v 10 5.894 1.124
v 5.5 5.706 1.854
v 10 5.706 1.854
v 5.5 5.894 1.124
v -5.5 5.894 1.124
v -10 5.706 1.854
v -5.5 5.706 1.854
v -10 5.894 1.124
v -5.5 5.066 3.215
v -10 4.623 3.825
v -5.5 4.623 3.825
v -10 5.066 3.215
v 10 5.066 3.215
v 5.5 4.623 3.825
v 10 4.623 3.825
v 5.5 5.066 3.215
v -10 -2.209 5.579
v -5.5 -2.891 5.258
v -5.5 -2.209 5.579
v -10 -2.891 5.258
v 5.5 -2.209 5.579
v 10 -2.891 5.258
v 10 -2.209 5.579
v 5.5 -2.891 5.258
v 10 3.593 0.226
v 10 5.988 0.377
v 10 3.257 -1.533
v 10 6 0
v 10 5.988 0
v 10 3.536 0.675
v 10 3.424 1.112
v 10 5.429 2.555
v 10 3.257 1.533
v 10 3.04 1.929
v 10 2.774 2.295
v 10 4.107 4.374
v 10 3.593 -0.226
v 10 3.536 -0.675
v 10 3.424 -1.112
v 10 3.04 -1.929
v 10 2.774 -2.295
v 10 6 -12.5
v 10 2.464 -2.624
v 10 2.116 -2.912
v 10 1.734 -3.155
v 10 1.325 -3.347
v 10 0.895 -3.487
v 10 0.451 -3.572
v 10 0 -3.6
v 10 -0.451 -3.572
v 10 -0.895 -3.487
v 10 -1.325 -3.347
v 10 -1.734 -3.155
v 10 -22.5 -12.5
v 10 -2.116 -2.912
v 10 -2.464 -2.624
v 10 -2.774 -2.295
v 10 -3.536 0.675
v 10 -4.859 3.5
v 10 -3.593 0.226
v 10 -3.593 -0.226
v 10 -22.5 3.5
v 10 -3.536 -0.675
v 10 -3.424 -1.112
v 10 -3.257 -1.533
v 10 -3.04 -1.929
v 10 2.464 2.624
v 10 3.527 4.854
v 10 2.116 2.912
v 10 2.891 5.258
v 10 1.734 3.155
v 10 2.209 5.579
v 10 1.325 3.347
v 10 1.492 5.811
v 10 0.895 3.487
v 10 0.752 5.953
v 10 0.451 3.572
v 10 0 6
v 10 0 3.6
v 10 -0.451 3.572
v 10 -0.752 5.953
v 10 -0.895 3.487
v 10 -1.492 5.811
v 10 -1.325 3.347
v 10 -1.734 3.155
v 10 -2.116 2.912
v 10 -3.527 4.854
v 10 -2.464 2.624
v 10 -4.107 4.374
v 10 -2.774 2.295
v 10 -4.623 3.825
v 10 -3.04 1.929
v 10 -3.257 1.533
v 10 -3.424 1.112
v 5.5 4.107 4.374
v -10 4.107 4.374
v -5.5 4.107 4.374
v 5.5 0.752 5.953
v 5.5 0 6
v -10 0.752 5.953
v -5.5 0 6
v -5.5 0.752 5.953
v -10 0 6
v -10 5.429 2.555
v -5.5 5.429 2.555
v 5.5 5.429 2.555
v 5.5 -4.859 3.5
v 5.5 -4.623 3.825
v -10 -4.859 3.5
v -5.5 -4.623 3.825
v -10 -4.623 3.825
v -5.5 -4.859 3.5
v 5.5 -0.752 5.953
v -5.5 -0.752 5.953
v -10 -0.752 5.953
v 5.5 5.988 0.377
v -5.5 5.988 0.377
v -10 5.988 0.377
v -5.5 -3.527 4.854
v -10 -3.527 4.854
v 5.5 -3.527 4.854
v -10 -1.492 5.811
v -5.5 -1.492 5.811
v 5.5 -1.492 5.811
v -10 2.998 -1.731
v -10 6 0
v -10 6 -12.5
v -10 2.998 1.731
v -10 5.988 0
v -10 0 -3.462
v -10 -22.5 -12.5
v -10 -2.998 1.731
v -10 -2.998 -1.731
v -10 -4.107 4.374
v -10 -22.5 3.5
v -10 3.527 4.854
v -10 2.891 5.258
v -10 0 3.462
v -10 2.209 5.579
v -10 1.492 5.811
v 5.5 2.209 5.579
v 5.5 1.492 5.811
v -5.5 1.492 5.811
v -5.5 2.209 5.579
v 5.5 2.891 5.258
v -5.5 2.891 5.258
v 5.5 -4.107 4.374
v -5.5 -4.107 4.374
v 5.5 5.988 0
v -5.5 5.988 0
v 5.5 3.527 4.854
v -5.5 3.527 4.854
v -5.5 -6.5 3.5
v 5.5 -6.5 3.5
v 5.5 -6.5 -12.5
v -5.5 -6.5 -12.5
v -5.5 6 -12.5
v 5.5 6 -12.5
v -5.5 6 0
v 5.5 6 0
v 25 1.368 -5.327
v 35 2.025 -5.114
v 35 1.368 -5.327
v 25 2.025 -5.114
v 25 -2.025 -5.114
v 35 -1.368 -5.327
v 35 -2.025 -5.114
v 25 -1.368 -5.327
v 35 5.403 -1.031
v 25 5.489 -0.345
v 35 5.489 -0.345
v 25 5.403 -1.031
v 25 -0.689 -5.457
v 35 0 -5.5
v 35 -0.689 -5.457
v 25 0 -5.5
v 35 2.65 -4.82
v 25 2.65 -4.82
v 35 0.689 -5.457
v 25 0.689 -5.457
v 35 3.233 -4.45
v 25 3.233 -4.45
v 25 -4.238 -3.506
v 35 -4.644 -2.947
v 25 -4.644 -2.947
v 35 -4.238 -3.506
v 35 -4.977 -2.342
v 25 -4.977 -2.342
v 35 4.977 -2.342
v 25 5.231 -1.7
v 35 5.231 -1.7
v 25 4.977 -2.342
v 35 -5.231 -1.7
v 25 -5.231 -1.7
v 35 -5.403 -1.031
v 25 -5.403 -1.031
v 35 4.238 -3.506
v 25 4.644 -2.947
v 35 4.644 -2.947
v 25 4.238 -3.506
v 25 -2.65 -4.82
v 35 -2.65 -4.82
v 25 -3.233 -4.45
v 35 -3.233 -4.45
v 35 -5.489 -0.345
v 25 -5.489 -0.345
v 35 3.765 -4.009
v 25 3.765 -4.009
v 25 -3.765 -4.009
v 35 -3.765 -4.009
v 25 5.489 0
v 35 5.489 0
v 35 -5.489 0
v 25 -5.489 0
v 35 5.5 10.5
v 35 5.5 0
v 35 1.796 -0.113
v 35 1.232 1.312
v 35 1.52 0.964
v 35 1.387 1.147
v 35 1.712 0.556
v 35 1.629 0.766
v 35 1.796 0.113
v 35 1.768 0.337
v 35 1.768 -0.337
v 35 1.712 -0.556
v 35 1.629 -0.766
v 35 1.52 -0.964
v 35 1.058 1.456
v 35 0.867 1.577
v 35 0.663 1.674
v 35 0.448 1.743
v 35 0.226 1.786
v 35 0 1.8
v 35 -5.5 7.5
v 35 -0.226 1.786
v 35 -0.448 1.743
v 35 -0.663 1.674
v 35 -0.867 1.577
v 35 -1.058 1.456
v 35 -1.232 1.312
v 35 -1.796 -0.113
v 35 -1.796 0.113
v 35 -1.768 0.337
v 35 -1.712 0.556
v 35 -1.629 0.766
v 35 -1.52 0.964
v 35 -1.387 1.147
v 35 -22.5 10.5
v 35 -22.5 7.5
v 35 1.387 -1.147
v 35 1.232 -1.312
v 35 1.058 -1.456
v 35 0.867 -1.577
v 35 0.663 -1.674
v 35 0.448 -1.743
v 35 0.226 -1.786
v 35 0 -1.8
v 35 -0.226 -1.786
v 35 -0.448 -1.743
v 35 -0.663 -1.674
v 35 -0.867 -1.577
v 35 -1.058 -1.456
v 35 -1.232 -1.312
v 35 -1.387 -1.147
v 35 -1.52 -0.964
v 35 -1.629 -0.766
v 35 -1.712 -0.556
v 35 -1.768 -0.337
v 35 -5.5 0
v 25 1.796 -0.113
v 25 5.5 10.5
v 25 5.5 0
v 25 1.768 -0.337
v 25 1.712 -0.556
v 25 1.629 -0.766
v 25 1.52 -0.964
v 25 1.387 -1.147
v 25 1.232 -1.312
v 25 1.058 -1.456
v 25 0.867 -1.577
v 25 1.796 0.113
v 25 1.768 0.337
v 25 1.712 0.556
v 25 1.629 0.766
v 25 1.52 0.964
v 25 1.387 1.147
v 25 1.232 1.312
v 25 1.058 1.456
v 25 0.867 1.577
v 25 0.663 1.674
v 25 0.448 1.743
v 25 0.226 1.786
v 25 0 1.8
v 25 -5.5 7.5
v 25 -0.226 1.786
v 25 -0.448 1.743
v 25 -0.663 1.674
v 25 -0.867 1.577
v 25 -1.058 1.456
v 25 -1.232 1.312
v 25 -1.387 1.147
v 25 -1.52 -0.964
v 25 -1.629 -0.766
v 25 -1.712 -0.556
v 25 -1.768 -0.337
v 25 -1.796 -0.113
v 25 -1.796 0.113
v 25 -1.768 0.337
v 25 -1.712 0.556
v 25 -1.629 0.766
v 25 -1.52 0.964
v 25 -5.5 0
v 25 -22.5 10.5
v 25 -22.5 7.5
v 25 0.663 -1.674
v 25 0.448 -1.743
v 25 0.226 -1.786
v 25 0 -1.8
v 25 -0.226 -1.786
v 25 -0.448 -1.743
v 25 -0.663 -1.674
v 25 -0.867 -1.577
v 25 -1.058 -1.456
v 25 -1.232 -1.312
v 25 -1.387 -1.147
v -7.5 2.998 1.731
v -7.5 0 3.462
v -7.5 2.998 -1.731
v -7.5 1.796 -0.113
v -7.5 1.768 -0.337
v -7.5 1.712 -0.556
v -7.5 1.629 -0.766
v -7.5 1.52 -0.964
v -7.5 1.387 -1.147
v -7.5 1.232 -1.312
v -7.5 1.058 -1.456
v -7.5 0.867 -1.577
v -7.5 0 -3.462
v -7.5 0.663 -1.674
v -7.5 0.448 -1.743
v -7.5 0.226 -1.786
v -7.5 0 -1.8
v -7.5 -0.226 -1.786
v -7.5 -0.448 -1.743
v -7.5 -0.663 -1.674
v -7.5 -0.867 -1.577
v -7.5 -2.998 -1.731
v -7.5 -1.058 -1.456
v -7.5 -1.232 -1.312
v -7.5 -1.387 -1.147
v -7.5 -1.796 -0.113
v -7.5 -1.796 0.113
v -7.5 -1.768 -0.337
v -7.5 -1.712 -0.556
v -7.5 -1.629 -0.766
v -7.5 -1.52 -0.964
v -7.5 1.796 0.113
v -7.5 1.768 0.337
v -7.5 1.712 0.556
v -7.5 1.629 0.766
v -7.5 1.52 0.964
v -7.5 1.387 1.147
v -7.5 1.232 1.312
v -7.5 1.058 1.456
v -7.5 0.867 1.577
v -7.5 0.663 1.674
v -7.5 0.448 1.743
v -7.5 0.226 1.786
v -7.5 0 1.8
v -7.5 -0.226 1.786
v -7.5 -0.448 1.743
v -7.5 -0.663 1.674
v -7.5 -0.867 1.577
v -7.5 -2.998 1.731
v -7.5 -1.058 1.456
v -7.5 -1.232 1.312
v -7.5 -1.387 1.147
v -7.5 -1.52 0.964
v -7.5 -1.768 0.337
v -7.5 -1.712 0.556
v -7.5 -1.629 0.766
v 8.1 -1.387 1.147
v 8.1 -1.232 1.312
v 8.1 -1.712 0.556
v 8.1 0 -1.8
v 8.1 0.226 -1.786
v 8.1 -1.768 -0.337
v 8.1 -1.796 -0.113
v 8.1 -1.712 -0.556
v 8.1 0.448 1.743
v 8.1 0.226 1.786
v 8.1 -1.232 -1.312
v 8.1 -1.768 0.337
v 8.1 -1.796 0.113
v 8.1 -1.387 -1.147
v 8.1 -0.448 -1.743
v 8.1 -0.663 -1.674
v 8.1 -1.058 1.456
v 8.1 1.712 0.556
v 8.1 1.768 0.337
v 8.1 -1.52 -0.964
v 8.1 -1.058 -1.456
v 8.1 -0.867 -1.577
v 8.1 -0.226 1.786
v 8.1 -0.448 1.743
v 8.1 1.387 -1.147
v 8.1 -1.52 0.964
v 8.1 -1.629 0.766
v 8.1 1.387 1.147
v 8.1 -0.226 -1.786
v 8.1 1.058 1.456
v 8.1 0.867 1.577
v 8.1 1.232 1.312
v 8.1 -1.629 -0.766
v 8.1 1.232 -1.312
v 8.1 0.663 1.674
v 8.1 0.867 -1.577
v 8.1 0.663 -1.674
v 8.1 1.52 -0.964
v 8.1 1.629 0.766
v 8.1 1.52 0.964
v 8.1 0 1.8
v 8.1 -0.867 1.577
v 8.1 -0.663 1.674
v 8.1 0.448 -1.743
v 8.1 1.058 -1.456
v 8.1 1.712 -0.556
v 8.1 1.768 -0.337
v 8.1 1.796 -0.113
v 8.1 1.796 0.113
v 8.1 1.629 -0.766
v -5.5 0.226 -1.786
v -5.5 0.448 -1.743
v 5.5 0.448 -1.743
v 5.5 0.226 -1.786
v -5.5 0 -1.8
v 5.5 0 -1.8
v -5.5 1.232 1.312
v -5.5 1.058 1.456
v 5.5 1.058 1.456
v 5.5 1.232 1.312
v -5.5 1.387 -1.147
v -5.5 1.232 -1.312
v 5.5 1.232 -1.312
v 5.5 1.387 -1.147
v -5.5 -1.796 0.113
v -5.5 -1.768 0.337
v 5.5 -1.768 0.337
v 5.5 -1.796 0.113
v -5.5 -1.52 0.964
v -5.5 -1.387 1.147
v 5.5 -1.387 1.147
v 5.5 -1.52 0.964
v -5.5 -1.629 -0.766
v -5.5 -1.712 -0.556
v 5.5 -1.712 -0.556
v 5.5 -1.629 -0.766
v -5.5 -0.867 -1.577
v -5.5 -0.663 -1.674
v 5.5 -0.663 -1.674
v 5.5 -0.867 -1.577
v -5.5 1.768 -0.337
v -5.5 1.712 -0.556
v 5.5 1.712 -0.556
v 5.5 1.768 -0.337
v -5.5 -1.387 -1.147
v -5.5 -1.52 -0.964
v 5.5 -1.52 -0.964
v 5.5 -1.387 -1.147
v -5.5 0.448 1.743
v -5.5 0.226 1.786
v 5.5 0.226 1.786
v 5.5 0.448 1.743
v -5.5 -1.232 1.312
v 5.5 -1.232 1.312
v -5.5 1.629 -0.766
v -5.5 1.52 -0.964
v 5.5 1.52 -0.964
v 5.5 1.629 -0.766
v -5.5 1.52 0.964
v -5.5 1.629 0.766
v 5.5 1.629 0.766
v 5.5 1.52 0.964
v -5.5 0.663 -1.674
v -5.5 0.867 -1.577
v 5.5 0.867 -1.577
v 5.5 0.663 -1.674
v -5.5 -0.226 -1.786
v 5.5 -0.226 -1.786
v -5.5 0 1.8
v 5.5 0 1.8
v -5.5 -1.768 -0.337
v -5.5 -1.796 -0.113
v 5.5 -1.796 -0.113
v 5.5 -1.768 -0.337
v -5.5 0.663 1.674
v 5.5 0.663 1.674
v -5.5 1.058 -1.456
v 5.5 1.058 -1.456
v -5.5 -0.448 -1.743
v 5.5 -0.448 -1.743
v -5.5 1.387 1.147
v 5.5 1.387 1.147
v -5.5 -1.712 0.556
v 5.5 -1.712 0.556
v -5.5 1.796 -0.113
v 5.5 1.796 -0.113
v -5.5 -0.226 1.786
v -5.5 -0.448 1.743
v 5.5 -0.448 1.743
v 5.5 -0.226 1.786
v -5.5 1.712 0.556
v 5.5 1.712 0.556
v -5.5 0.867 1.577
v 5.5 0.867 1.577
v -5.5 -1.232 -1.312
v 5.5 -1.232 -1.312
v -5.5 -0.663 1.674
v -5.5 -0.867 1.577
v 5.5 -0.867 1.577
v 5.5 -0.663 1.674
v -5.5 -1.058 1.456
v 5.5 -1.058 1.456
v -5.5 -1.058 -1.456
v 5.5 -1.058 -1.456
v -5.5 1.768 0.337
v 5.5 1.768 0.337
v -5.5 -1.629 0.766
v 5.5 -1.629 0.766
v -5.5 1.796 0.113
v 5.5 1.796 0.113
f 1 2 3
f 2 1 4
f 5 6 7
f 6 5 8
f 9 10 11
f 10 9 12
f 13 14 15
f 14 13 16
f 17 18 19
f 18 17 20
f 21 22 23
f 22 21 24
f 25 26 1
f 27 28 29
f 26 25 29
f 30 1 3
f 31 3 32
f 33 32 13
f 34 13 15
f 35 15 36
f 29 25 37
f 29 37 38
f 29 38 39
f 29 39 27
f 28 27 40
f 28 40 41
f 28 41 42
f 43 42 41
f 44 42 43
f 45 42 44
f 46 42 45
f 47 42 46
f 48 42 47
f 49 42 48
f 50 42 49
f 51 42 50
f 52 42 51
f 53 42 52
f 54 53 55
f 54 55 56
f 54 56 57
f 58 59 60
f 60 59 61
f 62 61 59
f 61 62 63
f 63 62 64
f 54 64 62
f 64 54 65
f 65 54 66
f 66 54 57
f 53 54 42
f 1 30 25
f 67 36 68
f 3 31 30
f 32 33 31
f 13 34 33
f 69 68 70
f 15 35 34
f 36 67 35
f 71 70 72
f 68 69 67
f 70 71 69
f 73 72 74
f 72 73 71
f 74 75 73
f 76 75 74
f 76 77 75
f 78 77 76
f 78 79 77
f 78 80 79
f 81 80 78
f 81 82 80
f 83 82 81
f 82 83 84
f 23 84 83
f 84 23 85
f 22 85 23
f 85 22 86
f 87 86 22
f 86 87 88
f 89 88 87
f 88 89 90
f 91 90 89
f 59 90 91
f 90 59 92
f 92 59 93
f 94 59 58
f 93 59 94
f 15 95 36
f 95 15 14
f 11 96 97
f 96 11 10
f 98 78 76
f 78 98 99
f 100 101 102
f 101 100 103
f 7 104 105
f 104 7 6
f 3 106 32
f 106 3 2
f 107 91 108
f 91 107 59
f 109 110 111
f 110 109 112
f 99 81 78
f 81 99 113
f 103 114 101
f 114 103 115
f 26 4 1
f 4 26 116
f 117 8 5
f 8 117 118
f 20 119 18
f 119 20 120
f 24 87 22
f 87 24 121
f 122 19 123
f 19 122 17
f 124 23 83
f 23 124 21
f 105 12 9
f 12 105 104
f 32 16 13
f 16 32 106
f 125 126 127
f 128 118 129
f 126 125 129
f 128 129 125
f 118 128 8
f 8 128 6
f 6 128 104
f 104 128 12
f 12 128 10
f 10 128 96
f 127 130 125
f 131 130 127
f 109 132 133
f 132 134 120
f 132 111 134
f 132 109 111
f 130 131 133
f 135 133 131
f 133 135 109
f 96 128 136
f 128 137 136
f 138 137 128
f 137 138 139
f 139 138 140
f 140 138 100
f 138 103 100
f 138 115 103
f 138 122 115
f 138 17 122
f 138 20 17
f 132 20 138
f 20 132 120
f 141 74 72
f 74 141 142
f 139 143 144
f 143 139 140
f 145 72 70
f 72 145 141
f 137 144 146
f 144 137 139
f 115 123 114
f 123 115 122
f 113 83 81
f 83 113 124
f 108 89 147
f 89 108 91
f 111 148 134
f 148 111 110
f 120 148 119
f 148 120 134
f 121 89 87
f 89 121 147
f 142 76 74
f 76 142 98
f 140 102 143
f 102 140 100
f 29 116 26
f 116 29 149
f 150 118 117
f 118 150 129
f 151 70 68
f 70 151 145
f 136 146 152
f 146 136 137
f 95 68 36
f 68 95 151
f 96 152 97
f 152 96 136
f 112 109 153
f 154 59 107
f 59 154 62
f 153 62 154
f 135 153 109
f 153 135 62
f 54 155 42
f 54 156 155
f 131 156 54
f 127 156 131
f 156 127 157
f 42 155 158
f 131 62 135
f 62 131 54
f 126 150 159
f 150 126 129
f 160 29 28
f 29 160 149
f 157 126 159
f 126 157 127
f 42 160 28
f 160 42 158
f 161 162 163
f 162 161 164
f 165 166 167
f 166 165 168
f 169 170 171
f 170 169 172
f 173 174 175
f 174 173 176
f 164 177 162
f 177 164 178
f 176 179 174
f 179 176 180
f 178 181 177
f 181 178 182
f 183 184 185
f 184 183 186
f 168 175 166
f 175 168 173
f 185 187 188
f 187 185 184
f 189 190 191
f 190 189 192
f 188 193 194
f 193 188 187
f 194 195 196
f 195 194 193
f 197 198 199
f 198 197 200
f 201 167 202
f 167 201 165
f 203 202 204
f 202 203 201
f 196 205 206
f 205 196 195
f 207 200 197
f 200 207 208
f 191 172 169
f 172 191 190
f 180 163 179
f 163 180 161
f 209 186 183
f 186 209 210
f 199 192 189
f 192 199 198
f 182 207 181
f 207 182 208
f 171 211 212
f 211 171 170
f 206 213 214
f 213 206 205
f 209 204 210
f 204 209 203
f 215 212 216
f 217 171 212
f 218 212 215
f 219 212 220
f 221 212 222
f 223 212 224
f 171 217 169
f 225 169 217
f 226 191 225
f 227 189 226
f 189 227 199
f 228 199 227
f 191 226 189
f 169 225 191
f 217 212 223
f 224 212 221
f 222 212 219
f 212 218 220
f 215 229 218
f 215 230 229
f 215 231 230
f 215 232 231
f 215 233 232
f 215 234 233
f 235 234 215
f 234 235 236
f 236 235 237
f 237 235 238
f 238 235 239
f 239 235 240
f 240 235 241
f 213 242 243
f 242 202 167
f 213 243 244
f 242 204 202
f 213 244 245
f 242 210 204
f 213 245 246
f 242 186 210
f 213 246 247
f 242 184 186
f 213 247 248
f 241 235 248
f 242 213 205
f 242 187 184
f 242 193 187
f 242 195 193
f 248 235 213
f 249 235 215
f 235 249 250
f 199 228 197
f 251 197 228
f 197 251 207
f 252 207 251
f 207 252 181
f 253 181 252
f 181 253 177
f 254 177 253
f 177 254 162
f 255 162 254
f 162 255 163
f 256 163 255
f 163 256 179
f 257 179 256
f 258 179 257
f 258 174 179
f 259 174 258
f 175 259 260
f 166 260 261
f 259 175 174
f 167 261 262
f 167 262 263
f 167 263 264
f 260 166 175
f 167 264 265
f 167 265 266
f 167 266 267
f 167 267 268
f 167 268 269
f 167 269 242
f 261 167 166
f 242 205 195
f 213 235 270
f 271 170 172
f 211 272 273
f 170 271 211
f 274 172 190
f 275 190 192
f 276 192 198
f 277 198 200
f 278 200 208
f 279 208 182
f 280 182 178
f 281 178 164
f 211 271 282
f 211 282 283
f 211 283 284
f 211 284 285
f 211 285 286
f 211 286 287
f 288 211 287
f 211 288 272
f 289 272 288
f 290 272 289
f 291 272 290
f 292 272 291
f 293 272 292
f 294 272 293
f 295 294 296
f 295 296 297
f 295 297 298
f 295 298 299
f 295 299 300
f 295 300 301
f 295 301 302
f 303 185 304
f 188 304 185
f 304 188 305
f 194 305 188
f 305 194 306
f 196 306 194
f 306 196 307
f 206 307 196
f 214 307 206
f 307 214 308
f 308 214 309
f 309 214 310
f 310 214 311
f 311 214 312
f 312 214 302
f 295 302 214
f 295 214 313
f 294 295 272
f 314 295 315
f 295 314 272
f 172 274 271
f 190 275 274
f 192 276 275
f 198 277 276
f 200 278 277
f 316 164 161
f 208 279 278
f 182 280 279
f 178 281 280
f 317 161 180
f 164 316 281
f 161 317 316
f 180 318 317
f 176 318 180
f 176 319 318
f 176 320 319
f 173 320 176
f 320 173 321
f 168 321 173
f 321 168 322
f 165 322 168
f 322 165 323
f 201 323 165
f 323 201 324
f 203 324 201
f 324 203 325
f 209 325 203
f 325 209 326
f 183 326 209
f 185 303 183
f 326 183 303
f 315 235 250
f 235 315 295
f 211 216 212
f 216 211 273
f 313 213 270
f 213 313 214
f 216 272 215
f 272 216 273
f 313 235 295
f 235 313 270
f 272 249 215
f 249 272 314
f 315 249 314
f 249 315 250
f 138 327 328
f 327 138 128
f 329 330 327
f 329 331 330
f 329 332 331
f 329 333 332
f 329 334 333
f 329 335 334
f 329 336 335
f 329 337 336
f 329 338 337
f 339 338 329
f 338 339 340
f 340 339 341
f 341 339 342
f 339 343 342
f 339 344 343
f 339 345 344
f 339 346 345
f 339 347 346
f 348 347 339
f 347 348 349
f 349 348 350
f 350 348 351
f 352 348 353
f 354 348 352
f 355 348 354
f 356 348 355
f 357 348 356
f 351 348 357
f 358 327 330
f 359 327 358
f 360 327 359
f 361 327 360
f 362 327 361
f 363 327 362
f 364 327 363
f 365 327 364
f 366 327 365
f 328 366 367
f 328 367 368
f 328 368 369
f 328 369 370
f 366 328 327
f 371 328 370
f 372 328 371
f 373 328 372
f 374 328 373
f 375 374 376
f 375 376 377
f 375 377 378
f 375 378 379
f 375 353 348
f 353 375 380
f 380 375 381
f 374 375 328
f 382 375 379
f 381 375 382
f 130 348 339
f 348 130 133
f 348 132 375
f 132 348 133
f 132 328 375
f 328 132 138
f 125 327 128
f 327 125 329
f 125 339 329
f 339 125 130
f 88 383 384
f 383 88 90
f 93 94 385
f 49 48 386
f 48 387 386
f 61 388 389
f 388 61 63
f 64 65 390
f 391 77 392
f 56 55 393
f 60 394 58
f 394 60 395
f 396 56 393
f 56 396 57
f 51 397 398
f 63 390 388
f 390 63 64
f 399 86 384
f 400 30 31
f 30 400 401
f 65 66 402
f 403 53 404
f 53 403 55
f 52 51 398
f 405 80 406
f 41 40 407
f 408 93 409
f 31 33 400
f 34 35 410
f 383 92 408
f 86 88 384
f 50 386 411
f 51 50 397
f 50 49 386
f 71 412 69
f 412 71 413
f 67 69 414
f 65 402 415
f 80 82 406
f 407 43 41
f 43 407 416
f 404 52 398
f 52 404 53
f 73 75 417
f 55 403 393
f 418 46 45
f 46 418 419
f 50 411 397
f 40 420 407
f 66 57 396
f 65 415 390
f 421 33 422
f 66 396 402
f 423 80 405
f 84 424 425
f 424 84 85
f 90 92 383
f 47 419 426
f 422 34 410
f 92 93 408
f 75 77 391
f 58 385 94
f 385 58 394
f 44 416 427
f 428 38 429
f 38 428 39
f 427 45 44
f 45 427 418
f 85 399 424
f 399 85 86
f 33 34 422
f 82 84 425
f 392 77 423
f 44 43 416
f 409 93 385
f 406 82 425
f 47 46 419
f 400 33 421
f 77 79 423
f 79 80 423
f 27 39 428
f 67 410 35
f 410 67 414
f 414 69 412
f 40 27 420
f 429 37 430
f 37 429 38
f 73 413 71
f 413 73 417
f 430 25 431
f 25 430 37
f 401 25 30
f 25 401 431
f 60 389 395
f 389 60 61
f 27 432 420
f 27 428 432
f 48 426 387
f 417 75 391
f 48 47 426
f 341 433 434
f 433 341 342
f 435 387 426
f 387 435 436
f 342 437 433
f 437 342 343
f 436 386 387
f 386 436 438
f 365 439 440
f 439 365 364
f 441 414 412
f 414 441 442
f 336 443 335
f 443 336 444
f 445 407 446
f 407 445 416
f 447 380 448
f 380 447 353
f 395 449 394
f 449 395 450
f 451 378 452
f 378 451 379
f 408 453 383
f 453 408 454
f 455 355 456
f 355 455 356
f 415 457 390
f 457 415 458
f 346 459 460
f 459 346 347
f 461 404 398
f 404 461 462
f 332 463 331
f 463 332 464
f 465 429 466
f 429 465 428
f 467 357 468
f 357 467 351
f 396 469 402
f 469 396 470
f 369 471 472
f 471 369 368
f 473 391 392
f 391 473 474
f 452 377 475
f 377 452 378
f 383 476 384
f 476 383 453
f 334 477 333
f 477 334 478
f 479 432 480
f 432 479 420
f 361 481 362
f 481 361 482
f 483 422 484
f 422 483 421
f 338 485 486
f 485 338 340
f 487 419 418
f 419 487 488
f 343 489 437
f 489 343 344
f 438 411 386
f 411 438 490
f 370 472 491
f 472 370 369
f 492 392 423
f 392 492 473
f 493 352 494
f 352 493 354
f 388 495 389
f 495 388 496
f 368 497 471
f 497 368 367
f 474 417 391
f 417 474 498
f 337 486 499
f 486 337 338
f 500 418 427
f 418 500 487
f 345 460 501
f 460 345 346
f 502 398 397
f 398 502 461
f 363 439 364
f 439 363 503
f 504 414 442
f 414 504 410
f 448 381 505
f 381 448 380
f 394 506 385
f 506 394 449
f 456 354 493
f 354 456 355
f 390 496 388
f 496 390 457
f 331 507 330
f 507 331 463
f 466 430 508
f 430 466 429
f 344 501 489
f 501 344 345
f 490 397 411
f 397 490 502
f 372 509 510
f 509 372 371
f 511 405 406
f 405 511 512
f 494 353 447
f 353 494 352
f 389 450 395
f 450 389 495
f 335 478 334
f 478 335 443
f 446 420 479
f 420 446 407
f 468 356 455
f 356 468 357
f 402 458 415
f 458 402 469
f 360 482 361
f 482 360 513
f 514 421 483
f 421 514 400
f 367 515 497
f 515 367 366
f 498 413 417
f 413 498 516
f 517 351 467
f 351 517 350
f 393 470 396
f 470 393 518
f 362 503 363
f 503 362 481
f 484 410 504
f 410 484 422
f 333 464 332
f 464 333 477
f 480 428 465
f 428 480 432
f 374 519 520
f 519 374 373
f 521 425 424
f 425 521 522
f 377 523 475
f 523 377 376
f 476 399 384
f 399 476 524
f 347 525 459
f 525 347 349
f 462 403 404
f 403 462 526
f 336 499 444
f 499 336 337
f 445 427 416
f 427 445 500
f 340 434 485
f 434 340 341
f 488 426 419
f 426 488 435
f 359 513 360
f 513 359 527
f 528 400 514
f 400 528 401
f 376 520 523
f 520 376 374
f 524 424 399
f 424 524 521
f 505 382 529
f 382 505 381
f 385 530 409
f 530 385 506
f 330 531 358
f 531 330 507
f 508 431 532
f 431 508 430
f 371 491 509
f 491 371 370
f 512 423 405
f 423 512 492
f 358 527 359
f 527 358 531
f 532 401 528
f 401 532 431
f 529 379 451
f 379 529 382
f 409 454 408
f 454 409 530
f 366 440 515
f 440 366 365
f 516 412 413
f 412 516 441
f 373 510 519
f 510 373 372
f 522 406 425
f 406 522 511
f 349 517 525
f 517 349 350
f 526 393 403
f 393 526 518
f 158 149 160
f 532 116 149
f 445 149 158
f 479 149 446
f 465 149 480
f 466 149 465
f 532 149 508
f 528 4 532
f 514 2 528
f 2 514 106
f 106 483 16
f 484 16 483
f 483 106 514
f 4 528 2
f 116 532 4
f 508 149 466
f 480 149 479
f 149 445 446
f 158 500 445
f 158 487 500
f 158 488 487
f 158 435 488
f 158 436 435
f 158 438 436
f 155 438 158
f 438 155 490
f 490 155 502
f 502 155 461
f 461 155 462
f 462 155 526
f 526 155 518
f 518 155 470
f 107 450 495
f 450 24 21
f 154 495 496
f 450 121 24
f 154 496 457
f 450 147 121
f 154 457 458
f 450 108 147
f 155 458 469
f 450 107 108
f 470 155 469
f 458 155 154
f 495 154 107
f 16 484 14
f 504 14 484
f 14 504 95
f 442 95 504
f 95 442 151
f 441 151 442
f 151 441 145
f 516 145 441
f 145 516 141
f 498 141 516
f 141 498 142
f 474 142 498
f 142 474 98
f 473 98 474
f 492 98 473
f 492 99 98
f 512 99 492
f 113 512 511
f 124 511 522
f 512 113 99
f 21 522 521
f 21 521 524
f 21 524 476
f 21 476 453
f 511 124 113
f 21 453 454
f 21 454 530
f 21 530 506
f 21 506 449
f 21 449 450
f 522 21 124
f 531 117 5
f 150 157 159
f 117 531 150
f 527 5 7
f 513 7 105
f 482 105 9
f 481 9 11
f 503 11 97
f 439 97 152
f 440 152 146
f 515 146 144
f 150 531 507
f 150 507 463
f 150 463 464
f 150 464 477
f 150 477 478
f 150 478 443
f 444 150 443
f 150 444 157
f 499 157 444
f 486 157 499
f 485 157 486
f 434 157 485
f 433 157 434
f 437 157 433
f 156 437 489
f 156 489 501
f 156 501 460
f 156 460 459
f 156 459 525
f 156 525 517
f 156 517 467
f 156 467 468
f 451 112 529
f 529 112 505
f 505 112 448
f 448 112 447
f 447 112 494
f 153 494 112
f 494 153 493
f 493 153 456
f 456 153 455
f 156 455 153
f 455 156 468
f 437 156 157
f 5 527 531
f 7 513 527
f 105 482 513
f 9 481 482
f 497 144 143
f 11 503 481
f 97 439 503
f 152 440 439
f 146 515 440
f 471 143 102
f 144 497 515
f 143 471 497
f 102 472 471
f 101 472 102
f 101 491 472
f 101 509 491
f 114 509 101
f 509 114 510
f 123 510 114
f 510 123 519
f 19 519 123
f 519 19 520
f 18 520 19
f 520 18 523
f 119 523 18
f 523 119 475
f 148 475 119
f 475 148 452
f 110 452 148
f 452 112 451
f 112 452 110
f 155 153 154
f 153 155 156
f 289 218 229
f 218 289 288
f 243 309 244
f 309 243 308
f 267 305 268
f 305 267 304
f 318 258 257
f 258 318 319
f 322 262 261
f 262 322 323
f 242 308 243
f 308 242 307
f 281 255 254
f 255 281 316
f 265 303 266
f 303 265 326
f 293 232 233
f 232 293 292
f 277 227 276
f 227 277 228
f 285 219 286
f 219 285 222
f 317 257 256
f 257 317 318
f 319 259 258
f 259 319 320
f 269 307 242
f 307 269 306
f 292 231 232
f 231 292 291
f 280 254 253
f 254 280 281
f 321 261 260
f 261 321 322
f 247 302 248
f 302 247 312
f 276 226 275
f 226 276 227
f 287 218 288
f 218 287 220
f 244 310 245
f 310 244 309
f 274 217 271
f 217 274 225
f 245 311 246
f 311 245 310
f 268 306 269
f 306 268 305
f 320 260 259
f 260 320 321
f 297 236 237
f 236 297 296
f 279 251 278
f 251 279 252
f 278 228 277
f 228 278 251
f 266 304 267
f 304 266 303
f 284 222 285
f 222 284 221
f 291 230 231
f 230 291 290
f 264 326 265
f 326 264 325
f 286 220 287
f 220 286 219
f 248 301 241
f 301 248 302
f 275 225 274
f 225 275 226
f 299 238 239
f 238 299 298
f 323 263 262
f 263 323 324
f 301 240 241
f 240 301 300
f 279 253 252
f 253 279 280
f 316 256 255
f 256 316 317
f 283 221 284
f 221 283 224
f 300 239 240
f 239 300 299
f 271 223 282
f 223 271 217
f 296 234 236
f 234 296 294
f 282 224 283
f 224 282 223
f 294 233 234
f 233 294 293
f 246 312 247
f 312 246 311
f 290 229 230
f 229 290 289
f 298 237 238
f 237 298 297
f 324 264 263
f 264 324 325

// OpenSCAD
$fn = 50;


difference() {
	union() {
		translate(v = [-10.0000000000, 0, 0.0000000000]) {
			rotate(a = [0, 90, 0]) {
				cylinder(h = 20, r = 6.0000000000);
			}
		}
		translate(v = [-10.0000000000, -22.5000000000, -12.5000000000]) {
			cube(size = [20, 22.5000000000, 16]);
		}
		translate(v = [-10.0000000000, -21.0000000000, -12.5000000000]) {
			cube(size = [20, 27, 12.5000000000]);
		}
		translate(v = [25.0000000000, 0, 0.0000000000]) {
			rotate(a = [0, 90, 0]) {
				cylinder(h = 10, r = 5.5000000000);
			}
		}
		translate(v = [25.0000000000, -5.5000000000, 0]) {
			cube(size = [10, 11, 7.5000000000]);
		}
		translate(v = [25.0000000000, -22.5000000000, 7.5000000000]) {
			cube(size = [10, 28.0000000000, 3]);
		}
	}
	union() {
		translate(v = [10.0000000000, 0, 0]) {
			rotate(a = [0, 90, 0]) {
				difference() {
					union() {
						translate(v = [0, 0, -20.0000000000]) {
							rotate(a = [0, 0, 0]) {
								difference() {
									union() {
										linear_extrude(height = 2.5000000000) {
											polygon(points = [[3.4620000000, 0.0000000000], [1.7310000000, 2.9981799479], [-1.7310000000, 2.9981799479], [-3.4620000000, 0.0000000000], [-1.7310000000, -2.9981799479], [1.7310000000, -2.9981799479]]);
										}
									}
									union();
								}
							}
						}
						translate(v = [0, 0, -20.0000000000]) {
							rotate(a = [0, 0, 0]) {
								difference() {
									union() {
										linear_extrude(height = 2.5000000000) {
											polygon(points = [[3.4620000000, 0.0000000000], [1.7310000000, 2.9981799479], [-1.7310000000, 2.9981799479], [-3.4620000000, 0.0000000000], [-1.7310000000, -2.9981799479], [1.7310000000, -2.9981799479]]);
										}
									}
									union();
								}
							}
						}
						translate(v = [0, 0, -20.0000000000]) {
							rotate(a = [0, 0, 0]) {
								difference() {
									union() {
										linear_extrude(height = 2.5000000000) {
											polygon(points = [[3.4620000000, 0.0000000000], [1.7310000000, 2.9981799479], [-1.7310000000, 2.9981799479], [-3.4620000000, 0.0000000000], [-1.7310000000, -2.9981799479], [1.7310000000, -2.9981799479]]);
										}
									}
									union();
								}
							}
						}
						translate(v = [0, 0, -20.0000000000]) {
							cylinder(h = 20, r = 1.5000000000);
						}
						translate(v = [0, 0, -1.9000000000]) {
							cylinder(h = 1.9000000000, r1 = 1.8000000000, r2 = 3.6000000000);
						}
						translate(v = [0, 0, -20.0000000000]) {
							cylinder(h = 20, r = 1.8000000000);
						}
						translate(v = [0, 0, -20.0000000000]) {
							cylinder(h = 20, r = 1.5000000000);
						}
					}
					union();
				}
			}
		}
		translate(v = [-5.5000000000, -6.5000000000, -12.5000000000]) {
			cube(size = [11, 16, 20]);
		}
		translate(v = [25.0000000000, 0, 0]) {
			rotate(a = [0, 90, 0]) {
				cylinder(h = 10, r = 1.8000000000);
			}
		}
	}
}
